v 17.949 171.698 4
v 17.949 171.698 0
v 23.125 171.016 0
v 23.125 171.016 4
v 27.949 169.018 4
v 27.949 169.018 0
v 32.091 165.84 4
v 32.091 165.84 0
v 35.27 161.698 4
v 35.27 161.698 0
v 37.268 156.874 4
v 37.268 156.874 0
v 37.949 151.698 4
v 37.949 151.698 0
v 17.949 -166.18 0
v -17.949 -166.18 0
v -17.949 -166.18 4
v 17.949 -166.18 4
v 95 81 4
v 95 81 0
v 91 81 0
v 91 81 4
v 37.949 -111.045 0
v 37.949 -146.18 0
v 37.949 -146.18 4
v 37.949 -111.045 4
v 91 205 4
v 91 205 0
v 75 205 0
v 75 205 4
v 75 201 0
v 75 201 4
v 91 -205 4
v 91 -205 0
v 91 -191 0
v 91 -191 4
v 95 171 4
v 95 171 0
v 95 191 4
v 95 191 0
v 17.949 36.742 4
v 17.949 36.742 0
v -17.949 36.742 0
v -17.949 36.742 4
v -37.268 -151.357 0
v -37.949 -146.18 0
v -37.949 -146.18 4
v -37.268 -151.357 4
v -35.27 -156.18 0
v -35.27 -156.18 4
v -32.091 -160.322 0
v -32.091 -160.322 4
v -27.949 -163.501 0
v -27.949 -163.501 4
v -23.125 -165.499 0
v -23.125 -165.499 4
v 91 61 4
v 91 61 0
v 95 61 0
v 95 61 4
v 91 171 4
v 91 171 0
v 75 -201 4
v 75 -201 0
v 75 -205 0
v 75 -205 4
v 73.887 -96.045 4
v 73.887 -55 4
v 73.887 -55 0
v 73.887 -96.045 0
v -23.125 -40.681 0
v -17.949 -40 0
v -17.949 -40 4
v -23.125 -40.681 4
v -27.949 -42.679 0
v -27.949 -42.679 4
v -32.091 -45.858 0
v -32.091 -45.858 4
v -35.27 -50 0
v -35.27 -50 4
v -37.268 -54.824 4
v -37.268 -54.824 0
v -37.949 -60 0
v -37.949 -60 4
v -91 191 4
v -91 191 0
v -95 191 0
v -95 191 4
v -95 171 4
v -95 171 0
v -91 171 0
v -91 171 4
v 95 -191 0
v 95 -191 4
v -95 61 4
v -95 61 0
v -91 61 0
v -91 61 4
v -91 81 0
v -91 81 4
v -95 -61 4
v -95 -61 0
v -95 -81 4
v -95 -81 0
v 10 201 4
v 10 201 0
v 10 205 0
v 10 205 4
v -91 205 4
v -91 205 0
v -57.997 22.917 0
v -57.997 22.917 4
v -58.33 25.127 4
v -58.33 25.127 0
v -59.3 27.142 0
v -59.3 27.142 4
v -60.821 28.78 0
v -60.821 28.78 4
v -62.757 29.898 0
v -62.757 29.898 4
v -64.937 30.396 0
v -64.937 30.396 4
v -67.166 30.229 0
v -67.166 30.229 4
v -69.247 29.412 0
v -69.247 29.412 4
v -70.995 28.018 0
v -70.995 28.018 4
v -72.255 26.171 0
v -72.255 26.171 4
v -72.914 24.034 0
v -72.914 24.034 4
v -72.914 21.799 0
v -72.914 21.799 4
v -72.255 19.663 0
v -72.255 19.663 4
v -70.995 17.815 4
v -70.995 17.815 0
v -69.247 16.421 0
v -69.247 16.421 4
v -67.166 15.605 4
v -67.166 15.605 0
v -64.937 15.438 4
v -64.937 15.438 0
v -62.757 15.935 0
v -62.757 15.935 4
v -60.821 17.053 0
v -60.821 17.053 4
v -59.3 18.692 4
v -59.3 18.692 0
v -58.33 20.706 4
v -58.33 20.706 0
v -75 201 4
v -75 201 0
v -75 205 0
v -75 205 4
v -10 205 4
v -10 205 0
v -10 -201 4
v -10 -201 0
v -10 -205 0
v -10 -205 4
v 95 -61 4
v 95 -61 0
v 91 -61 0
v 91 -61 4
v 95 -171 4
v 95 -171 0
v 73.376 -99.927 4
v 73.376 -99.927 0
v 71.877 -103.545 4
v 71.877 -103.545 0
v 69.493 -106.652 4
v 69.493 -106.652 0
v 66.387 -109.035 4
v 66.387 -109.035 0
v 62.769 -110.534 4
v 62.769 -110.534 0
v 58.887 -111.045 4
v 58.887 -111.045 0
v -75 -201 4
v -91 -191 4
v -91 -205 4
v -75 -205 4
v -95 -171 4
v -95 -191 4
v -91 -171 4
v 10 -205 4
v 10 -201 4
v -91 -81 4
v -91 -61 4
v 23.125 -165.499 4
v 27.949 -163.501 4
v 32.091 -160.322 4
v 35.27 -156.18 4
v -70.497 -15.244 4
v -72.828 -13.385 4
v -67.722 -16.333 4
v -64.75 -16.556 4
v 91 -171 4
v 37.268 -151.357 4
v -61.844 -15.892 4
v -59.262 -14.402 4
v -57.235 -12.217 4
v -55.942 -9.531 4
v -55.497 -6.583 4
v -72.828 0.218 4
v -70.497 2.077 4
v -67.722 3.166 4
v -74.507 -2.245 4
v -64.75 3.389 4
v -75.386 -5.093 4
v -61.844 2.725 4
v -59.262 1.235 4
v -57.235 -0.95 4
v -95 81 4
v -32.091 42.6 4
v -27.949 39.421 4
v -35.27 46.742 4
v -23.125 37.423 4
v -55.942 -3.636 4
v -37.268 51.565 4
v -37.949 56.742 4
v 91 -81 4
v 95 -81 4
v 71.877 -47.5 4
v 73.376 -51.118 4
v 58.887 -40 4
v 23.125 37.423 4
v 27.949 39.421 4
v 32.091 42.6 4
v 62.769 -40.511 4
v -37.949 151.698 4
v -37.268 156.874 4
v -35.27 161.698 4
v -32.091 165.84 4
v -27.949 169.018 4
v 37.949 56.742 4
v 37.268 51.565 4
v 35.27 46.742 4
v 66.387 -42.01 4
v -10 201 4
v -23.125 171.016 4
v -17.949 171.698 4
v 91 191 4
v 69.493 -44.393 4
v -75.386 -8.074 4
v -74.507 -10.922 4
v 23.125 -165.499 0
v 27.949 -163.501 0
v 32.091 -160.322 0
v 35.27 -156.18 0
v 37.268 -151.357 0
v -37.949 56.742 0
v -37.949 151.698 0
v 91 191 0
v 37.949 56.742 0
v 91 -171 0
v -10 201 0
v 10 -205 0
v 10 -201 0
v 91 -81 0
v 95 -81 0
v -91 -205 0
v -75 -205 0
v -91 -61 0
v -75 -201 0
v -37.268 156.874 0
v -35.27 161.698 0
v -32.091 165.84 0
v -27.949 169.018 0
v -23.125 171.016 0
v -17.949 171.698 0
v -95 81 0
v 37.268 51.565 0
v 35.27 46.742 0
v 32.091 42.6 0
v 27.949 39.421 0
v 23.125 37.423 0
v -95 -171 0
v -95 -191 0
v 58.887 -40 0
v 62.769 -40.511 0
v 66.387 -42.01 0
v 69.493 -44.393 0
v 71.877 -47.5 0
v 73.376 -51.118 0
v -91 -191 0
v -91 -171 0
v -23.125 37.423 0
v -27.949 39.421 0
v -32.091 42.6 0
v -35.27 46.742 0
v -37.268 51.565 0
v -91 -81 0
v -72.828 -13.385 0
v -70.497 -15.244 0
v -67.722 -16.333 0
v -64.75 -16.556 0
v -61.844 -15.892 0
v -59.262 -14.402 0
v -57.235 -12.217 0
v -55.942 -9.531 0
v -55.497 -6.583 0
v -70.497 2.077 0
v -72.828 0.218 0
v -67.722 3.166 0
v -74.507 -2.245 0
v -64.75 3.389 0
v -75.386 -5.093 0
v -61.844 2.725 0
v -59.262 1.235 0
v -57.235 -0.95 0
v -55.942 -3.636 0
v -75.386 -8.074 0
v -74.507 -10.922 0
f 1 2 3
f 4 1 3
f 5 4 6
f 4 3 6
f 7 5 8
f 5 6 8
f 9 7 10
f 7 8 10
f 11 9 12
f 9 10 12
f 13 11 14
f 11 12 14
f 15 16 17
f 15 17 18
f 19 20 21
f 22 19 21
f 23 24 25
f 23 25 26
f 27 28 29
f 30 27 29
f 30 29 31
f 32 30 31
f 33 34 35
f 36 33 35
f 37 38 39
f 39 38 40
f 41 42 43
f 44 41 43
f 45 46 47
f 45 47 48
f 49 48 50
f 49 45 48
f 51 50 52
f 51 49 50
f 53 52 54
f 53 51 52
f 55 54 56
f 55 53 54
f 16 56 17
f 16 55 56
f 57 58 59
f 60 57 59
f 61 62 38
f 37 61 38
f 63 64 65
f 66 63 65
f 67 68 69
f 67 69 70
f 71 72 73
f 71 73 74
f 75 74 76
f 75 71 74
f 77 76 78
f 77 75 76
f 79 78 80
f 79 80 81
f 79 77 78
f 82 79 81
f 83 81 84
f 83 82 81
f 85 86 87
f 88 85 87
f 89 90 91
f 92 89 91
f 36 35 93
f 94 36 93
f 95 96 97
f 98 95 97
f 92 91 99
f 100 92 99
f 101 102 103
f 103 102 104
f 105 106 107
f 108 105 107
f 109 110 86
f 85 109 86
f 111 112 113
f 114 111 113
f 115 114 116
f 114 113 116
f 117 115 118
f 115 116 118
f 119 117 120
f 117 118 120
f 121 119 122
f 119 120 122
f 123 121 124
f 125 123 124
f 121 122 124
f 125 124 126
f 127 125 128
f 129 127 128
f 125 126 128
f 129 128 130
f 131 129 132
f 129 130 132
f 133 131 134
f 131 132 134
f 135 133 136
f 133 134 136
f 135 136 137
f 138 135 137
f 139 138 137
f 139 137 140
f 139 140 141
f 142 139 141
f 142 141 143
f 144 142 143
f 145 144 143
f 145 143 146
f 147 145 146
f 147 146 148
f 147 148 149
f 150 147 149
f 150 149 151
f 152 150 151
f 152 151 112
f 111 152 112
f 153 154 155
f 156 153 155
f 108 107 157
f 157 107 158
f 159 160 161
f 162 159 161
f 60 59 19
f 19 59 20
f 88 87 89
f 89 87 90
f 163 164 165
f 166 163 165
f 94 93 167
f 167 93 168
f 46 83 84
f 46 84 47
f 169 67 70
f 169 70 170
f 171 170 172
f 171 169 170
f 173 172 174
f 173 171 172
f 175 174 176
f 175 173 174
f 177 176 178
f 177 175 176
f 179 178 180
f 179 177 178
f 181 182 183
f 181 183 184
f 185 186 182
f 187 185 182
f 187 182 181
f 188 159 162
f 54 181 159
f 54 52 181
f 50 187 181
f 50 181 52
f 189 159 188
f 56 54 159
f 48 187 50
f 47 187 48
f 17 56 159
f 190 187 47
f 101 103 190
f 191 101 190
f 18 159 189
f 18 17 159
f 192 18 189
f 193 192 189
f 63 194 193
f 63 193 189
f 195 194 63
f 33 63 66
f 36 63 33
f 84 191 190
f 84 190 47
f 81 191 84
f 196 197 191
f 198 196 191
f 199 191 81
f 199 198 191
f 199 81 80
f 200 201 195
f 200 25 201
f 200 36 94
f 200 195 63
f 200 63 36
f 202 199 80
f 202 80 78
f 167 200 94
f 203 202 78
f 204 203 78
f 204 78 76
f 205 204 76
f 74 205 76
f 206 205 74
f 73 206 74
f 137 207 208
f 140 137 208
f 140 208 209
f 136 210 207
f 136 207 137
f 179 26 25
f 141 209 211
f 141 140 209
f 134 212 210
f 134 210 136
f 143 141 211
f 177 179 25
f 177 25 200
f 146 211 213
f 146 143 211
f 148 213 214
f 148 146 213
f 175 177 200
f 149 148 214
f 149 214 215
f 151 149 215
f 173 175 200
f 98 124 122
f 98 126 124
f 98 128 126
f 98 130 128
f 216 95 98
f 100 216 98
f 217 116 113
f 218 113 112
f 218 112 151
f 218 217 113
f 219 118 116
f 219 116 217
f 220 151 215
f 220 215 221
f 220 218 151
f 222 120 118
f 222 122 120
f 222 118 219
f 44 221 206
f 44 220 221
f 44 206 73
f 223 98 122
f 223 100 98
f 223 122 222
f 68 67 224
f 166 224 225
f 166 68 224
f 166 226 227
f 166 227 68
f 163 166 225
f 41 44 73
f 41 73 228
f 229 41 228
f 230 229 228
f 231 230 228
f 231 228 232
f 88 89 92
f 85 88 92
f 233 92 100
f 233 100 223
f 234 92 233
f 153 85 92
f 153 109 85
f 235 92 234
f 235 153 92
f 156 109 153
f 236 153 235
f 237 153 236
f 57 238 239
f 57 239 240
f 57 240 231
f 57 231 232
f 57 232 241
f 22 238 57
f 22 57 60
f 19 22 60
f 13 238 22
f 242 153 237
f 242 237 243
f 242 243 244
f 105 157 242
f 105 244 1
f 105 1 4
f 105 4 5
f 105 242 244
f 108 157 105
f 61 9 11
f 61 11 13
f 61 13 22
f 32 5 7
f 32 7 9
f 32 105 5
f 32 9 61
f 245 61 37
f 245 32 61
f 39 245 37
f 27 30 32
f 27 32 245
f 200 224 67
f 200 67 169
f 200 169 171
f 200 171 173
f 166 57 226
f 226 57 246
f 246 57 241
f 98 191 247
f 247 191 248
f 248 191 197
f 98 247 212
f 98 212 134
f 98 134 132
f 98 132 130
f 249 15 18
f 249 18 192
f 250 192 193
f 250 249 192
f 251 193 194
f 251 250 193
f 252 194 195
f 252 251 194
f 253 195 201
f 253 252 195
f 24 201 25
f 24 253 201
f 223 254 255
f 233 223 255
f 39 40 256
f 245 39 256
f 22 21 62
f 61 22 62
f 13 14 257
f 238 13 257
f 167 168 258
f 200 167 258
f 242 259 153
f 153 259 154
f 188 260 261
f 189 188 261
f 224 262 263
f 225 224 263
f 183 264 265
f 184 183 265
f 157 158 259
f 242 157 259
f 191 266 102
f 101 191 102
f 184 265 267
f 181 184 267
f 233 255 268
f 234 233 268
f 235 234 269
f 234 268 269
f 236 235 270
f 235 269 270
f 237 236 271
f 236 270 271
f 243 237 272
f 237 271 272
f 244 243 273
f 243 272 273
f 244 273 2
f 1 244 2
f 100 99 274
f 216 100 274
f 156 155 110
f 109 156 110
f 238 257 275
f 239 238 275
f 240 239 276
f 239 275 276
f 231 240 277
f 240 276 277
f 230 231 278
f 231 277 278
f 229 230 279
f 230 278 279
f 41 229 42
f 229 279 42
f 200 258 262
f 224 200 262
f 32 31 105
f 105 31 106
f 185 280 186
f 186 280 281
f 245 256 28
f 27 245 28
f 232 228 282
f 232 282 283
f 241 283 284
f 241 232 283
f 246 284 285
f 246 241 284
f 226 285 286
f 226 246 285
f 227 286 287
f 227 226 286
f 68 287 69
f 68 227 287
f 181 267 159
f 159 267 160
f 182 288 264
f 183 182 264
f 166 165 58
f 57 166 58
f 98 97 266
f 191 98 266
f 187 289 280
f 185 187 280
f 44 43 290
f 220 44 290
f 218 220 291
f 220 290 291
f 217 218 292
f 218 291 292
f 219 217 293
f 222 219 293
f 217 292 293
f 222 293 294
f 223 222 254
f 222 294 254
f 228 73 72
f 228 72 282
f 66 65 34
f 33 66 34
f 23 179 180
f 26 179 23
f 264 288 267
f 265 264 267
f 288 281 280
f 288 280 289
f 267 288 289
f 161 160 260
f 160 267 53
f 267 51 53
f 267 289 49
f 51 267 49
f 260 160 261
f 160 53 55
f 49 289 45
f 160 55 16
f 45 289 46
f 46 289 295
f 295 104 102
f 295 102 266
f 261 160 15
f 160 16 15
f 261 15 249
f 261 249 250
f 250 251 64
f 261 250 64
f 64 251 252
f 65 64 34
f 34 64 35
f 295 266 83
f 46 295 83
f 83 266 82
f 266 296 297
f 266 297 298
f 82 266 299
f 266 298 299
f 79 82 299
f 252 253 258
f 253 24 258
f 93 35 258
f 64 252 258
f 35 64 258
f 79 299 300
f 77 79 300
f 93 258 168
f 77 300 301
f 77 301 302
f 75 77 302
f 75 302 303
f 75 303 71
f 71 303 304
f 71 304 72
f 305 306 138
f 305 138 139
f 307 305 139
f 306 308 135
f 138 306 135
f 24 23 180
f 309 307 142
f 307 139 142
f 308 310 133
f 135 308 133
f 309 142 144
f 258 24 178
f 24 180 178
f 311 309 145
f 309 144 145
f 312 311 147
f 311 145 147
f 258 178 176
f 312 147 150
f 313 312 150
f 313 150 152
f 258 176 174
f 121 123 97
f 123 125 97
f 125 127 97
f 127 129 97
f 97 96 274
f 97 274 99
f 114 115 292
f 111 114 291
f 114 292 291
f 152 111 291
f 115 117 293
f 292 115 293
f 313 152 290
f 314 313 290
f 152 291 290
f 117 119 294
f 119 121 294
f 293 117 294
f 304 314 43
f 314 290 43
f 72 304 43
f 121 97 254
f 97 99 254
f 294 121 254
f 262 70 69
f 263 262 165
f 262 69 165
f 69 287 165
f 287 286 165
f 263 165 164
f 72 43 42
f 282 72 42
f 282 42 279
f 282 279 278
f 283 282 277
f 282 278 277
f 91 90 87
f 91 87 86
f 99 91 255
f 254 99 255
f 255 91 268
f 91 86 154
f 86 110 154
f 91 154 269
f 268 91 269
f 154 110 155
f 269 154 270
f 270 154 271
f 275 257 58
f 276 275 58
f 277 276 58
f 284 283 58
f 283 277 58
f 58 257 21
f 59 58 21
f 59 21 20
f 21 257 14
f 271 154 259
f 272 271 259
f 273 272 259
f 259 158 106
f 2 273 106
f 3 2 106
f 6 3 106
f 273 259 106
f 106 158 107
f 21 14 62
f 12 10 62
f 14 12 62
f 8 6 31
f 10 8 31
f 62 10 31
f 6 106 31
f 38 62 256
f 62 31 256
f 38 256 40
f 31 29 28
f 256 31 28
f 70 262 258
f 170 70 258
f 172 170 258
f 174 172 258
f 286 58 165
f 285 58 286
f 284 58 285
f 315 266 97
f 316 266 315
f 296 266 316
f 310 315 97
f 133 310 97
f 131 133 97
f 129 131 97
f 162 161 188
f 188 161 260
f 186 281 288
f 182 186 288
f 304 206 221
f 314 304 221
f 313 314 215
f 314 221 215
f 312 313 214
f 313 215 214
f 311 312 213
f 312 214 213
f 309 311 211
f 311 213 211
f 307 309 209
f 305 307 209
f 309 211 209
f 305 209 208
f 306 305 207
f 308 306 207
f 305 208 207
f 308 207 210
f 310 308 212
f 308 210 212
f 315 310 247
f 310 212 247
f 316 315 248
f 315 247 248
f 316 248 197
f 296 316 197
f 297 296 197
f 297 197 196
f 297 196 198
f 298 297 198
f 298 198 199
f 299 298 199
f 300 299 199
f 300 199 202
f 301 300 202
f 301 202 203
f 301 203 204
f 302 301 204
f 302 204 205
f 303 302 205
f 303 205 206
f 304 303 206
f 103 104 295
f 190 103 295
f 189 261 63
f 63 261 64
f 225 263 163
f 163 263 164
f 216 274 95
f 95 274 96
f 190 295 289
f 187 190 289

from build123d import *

# Parameters (mm, degrees)
BOSS_EXTRUDE2_DEPTH = 4
CUT_EXTRUDE1_DEPTH  = 10
SKETCH3_R           = 7.5
SKETCH3_R_2         = 10
CUT_EXTRUDE2_DEPTH  = 10


with BuildPart() as part:
    # Sketch1 → Boss-Extrude2 (new body)
    with BuildSketch(Plane.XY):
        Polygon((-75, -201), (-10, -201), (-10, -205), (10, -205), (10, -201), (75, -201), (75, -205), (91, -205), (91, -191), (95, -191), (95, -171), (91, -171), (91, -81), (95, -81), (95, -61), (91, -61), (91, 61), (95, 61), (95, 81), (91, 81), (91, 171), (95, 171), (95, 191), (91, 191), (91, 205), (75, 205), (75, 201), (10, 201), (10, 205), (-10, 205), (-10, 201), (-75, 201), (-75, 205), (-91, 205), (-91, 191), (-95, 191), (-95, 171), (-91, 171), (-91, 81), (-95, 81), (-95, 61), (-91, 61), (-91, -61), (-95, -61), (-95, -81), (-91, -81), (-91, -171), (-95, -171), (-95, -191), (-91, -191), (-91, -205), (-75, -205), align=None)
        with BuildLine():
            Line((-17.949055326, 171.697819396), (17.949055326, 171.697819396))
            ThreePointArc((17.949055326, 171.697819396), (32.09119095, 165.83995502), (37.949055326, 151.697819396))
            Line((37.949055326, 151.697819396), (37.949055326, 56.741742537))
            ThreePointArc((37.949055326, 56.741742537), (32.09119095, 42.599606914), (17.949055326, 36.741742537))
            Line((17.949055326, 36.741742537), (-17.949055326, 36.741742537))
            ThreePointArc((-17.949055326, 36.741742537), (-32.09119095, 42.599606914), (-37.949055326, 56.741742537))
            Line((-37.949055326, 56.741742537), (-37.949055326, 151.697819396))
            ThreePointArc((-37.949055326, 151.697819396), (-32.09119095, 165.83995502), (-17.949055326, 171.697819396))
        make_face(mode=Mode.SUBTRACT)
        with BuildLine():
            Line((-17.949055326, -166.180135652), (17.949055326, -166.180135652))
            ThreePointArc((17.949055326, -166.180135652), (32.09119095, -160.322271276), (37.949055326, -146.180135652))
            Line((37.949055326, -146.180135652), (37.949055326, -60))
            ThreePointArc((37.949055326, -60), (32.09119095, -45.857864376), (17.949055326, -40))
            Line((17.949055326, -40), (-17.949055326, -40))
            ThreePointArc((-17.949055326, -40), (-32.09119095, -45.857864376), (-37.949055326, -60))
            Line((-37.949055326, -60), (-37.949055326, -146.180135652))
            ThreePointArc((-37.949055326, -146.180135652), (-32.09119095, -160.322271276), (-17.949055326, -166.180135652))
        make_face(mode=Mode.SUBTRACT)
    extrude(amount=BOSS_EXTRUDE2_DEPTH)

    # Sketch2 → Cut-Extrude1 (cut)
    with BuildSketch(Plane.XY.offset(4)):
        with BuildLine():
            Line((0, -40), (58.886613453, -40))
            ThreePointArc((58.886613453, -40), (69.49321517, -44.393398282), (73.886613453, -55))
            Line((73.886613453, -55), (73.886613453, -96.0450181))
            ThreePointArc((73.886613453, -96.0450181), (69.49321517, -106.651619817), (58.886613453, -111.0450181))
            Line((58.886613453, -111.0450181), (0, -111.0450181))
            Line((0, -111.0450181), (0, -40))
        make_face()
    extrude(amount=-CUT_EXTRUDE1_DEPTH, mode=Mode.SUBTRACT)

    # Sketch3 → Cut-Extrude2 (cut)
    with BuildSketch(Plane.XY.offset(4)):
        with Locations((-65.497286905, 22.916669932)):
            Circle(SKETCH3_R)
        with Locations((-65.497286905, -6.583495202)):
            Circle(SKETCH3_R_2)
    extrude(amount=-CUT_EXTRUDE2_DEPTH, mode=Mode.SUBTRACT)


solid = part.part
